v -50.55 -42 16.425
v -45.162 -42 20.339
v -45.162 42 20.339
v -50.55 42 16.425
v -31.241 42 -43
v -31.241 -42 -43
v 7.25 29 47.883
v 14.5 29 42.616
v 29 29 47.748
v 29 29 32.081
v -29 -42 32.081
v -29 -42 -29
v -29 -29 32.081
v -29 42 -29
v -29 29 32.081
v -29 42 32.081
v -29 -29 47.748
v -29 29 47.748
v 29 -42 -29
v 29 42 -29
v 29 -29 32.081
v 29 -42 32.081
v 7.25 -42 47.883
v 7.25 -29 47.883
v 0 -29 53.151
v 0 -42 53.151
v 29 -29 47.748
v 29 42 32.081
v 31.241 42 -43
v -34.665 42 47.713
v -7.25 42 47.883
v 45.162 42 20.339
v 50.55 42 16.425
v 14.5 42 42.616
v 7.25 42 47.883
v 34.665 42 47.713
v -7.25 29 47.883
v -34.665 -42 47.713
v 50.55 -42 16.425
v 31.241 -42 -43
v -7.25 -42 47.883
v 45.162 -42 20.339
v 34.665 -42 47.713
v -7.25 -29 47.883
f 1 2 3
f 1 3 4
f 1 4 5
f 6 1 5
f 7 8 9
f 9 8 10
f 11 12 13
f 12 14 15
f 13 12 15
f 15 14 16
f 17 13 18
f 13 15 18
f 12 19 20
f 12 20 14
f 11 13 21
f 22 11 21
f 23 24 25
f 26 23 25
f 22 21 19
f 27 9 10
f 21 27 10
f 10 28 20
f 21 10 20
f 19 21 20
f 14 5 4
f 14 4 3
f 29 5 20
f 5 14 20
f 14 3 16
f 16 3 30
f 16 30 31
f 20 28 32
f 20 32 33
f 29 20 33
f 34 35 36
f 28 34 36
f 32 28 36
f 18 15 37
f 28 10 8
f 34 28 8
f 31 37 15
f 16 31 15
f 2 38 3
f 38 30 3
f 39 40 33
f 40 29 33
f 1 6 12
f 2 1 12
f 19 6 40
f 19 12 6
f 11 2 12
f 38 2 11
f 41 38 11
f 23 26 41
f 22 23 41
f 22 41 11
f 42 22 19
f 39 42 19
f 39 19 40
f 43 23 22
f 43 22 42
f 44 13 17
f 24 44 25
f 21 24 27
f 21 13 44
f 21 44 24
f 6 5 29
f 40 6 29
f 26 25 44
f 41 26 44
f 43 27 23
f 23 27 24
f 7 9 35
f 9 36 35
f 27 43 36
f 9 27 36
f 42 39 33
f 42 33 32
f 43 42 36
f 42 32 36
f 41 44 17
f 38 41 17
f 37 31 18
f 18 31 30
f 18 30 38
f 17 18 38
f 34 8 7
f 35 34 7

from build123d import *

# Parameters (mm, degrees)
F1_DEPTH      = 42
F1_DEPTH_BACK = 42
F2_DEPTH      = 25
F4_DEPTH      = 65.4
F5_START      = -31.4
F3_W          = 58
F3_H          = 58
F5_DEPTH      = 75.6
F6_START      = -25
F3_W_2        = 2.2413287042
F6_DEPTH      = 53


with BuildPart() as f1:
    # F0 (on Front) → F1 (new body, two sides)
    with BuildSketch(Plane.XZ) as f1_sk:
        Polygon((-31.2413287042, -43), (31.2413287042, -43), (50.5495316972, 16.4245384838), (45.1621487729, 20.3387012929), (39.7747658486, 24.252864102), (29, 32.0811897203), (29, 29), (29, -29), (-29, -29), (-29, 29), (-29, 32.0811897203), (-45.1621487729, 20.3387012929), (-50.5495316972, 16.4245384838), align=None)
        Polygon((39.7747658486, 24.252864102), (45.1621487729, 20.3387012929), (34.6653007859, 47.7126932694), (7.25, 47.8834897045), (14.5, 42.6160563764), (29, 32.0811897203), align=None)
        Polygon((-34.6653007859, 47.7126932694), (-45.1621487729, 20.3387012929), (-29, 32.0811897203), (-7.25, 47.8834897045), align=None)
        Polygon((-7.25, 47.8834897045), (-29, 32.0811897203), (29, 32.0811897203), (14.5, 42.6160563764), (7.25, 47.8834897045), (0, 53.1509230325), align=None)
    extrude(amount=-F1_DEPTH)
    extrude(f1_sk.sketch, amount=F1_DEPTH_BACK)

    # F0 (on Front) → F2 (join)
    with BuildSketch(Plane.XZ):
        Polygon((-31.2413287042, -43), (31.2413287042, -43), (50.5495316972, 16.4245384838), (45.1621487729, 20.3387012929), (39.7747658486, 24.252864102), (29, 32.0811897203), (29, 29), (29, -29), (-29, -29), (-29, 29), (-29, 32.0811897203), (-45.1621487729, 20.3387012929), (-50.5495316972, 16.4245384838), align=None)
        Polygon((39.7747658486, 24.252864102), (45.1621487729, 20.3387012929), (34.6653007859, 47.7126932694), (7.25, 47.8834897045), (14.5, 42.6160563764), (29, 32.0811897203), align=None)
        Polygon((-34.6653007859, 47.7126932694), (-45.1621487729, 20.3387012929), (-29, 32.0811897203), (-7.25, 47.8834897045), align=None)
        Polygon((-7.25, 47.8834897045), (-29, 32.0811897203), (29, 32.0811897203), (14.5, 42.6160563764), (7.25, 47.8834897045), (0, 53.1509230325), align=None)
    extrude(amount=F2_DEPTH)

    # F0 (on Front) → F4 (cut)
    with BuildSketch(Plane.XZ):
        Polygon((-7.25, 47.8834897045), (-29, 32.0811897203), (29, 32.0811897203), (14.5, 42.6160563764), (7.25, 47.8834897045), (0, 53.1509230325), align=None)
    extrude(amount=-F4_DEPTH, mode=Mode.SUBTRACT)

    # F3 (on face) → F5 (cut)
    with BuildSketch(Plane(origin=(0, 0, -43), x_dir=(1, 0, 0), z_dir=(0, 0, -1)).offset(F5_START)):
        Rectangle(F3_W, F3_H)
    extrude(amount=-F5_DEPTH, mode=Mode.SUBTRACT)

    # F3 (on face) → F6 (join)
    with BuildSketch(Plane(origin=(0, 0, -43), x_dir=(1, 0, 0), z_dir=(0, 0, -1)).offset(F6_START)):
        with Locations((-30.1206643521, 0)):
            Rectangle(F3_W_2, F3_H)
        with Locations((30.1206643521, 0)):
            Rectangle(F3_W_2, F3_H)
    extrude(amount=-F6_DEPTH)


solid = f1.part
